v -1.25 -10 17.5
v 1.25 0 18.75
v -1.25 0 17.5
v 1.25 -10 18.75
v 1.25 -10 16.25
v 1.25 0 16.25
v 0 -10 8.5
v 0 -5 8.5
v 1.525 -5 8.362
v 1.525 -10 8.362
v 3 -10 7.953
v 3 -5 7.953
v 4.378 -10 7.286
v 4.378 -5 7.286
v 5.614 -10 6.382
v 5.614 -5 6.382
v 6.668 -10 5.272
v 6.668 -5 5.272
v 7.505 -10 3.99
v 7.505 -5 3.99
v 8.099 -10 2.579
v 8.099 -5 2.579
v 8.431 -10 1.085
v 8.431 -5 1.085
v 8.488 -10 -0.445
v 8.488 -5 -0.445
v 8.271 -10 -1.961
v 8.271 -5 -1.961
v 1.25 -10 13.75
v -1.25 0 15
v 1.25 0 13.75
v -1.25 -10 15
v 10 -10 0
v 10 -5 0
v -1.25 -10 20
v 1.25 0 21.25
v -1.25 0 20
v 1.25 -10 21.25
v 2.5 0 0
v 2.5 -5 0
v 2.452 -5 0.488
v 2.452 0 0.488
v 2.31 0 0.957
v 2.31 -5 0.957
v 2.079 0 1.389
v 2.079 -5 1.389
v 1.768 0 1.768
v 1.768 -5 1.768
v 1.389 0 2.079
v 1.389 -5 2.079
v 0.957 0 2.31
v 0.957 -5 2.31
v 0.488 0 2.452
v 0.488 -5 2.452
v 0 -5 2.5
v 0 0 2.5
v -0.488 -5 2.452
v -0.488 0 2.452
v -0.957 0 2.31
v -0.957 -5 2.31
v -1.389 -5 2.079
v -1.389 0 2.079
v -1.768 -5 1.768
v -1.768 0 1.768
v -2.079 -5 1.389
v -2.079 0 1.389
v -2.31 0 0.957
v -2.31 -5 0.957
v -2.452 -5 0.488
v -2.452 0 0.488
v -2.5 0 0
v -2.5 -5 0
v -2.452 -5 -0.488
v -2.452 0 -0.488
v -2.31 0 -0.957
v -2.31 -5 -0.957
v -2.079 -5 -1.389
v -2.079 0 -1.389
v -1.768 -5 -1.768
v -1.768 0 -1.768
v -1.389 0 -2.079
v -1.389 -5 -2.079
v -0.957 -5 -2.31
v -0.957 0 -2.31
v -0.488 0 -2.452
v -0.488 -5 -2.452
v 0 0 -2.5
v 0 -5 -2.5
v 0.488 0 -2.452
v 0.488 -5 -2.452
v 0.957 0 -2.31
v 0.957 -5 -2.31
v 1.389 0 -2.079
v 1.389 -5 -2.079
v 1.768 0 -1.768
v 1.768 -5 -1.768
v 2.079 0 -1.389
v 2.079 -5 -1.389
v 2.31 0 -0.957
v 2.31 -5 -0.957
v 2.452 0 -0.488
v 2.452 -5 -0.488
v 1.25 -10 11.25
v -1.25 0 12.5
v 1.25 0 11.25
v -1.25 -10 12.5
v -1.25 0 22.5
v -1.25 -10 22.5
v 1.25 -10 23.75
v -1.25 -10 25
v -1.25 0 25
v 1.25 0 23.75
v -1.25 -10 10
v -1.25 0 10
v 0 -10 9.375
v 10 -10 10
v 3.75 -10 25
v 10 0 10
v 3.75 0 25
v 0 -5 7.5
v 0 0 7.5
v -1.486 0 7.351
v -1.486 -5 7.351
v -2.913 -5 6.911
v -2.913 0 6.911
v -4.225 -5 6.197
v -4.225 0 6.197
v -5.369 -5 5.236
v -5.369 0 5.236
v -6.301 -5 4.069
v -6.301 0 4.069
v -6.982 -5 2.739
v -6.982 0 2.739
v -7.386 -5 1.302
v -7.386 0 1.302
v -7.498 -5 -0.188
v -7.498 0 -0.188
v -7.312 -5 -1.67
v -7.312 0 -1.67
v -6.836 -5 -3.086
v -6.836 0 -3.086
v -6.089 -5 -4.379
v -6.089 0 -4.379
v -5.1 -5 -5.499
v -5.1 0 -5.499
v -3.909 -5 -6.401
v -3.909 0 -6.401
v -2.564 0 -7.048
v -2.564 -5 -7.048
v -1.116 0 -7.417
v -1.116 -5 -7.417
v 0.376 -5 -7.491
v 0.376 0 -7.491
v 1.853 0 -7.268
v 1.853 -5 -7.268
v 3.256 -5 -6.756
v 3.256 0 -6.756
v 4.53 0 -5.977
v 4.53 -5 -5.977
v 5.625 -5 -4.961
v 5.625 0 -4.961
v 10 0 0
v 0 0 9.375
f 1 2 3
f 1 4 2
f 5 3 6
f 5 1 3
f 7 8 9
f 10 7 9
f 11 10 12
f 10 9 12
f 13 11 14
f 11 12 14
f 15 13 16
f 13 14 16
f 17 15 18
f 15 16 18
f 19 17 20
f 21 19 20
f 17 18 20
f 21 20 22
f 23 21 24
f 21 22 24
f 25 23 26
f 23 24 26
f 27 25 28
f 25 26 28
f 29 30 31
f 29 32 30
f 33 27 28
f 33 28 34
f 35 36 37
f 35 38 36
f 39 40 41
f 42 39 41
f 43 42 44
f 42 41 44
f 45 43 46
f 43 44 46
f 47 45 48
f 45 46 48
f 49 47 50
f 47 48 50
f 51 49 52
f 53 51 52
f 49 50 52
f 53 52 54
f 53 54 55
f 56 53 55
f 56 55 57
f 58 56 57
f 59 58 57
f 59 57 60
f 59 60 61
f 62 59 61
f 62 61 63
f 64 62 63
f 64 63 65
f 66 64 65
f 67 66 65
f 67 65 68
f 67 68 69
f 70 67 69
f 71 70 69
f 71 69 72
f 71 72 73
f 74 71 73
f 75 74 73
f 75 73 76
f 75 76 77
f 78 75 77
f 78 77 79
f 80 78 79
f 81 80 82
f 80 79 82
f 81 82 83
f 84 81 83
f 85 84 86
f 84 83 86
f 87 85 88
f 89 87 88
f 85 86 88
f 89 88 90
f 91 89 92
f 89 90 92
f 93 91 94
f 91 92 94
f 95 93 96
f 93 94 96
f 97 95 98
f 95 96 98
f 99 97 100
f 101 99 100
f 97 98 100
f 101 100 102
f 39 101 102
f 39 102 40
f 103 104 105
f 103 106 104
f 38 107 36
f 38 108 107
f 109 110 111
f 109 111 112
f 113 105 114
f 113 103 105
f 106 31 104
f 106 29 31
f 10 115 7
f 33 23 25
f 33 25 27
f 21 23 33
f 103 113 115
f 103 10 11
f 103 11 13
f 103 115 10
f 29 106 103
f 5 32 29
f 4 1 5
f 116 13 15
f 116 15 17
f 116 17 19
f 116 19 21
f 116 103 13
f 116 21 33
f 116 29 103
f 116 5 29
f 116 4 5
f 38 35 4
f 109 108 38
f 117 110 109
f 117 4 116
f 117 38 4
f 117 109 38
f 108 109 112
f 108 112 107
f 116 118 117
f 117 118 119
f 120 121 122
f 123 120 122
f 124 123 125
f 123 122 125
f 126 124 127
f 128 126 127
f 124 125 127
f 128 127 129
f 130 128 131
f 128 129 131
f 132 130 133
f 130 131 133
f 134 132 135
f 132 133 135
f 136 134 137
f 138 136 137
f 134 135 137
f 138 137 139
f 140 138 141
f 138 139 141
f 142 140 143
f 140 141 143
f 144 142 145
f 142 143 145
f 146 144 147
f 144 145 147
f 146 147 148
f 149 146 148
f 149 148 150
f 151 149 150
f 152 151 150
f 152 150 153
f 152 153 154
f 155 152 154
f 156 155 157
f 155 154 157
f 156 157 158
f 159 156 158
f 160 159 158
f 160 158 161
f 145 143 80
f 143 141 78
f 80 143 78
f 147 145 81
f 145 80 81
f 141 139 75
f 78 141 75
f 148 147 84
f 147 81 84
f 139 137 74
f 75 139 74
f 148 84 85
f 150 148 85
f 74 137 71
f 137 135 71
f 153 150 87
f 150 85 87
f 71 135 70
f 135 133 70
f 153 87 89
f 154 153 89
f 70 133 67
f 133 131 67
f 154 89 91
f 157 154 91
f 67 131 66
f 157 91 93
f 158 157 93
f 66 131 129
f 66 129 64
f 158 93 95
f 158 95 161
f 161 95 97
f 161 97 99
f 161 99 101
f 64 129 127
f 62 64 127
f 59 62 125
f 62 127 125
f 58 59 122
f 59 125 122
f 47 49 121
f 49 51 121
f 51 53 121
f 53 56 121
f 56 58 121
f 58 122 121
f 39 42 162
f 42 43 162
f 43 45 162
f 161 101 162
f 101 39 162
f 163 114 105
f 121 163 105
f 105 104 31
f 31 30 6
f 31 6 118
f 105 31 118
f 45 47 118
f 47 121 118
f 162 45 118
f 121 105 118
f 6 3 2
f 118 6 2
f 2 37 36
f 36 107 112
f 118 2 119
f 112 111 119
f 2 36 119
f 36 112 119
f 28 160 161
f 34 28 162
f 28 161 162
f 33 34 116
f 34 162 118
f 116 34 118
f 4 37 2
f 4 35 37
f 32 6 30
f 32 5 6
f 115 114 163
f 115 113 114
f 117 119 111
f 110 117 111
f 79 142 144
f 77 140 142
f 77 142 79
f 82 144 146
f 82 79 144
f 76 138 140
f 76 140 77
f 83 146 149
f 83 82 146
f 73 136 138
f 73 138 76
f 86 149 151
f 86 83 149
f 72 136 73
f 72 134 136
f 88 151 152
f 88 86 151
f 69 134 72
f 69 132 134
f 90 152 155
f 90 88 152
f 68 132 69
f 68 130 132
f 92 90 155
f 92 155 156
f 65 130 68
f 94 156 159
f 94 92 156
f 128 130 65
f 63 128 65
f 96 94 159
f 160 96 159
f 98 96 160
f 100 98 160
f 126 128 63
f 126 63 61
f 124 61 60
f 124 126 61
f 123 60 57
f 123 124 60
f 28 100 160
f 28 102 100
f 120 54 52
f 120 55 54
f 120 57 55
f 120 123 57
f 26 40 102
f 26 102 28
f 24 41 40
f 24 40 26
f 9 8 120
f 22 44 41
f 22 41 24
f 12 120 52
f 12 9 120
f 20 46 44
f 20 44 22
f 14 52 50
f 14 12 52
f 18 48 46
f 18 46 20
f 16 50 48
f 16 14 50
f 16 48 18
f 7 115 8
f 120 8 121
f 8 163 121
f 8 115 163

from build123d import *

# Parameters (mm, degrees)
F1_DEPTH      = 5
F3_DEPTH      = 5
F3_DEPTH_BACK = 5
F4_R          = 2.5
F5_DEPTH      = 5.001


with BuildPart() as f1:
    # F0 (on Front) → F1 (new body)
    with BuildSketch(Plane.XZ):
        with BuildLine():
            Line((0, 9.13175), (0, 7.5))
            ThreePointArc((0, 7.5), (-6.835784, -3.085784), (5.625, -4.960784))
            Line((5.625, -4.960784), (10, 0))
            Line((10, 0), (10, 10))
            Line((10, 10), (3.75, 25))
            Line((3.75, 25), (1.25, 25))
            Line((1.25, 25), (1.25, 10))
            Line((1.25, 10), (0, 9.13175))
        make_face()
    extrude(amount=F1_DEPTH)

    # F2 (on face) → F3 (join, two sides)
    with BuildSketch(Plane.XZ.offset(5)) as f3_sk:
        with BuildLine():
            Line((3.75, 25), (1.25, 25))
            Line((1.25, 25), (1.25, 23.75))
            Line((1.25, 23.75), (-1.25, 22.5))
            Line((-1.25, 22.5), (1.25, 21.25))
            Line((1.25, 21.25), (-1.25, 20))
            Line((-1.25, 20), (1.25, 18.75))
            Line((1.25, 18.75), (-1.25, 17.5))
            Line((-1.25, 17.5), (1.25, 16.25))
            Line((1.25, 16.25), (-1.25, 15))
            Line((-1.25, 15), (1.25, 13.75))
            Line((1.25, 13.75), (-1.25, 12.5))
            Line((-1.25, 12.5), (1.25, 11.25))
            Line((1.25, 11.25), (-1.25, 10))
            Line((-1.25, 10), (0, 9.375))
            Line((0, 9.375), (0, 9.13175))
            Line((0, 9.13175), (0, 8.5))
            ThreePointArc((0, 8.5), (6.667708, 5.27178), (8.270751, -1.960784))
            Line((8.270751, -1.960784), (10, 0))
            Line((10, 0), (10, 10))
            Line((10, 10), (3.75, 25))
        make_face()
        Polygon((1.25, 23.75), (1.25, 25), (-1.25, 25), align=None)
    extrude(amount=F3_DEPTH)
    extrude(f3_sk.sketch, amount=-F3_DEPTH_BACK)

    # F4 (on face) → F5 (cut, through all)
    with BuildSketch(Plane.XZ.offset(5)):
        Circle(F4_R)
    extrude(amount=-F5_DEPTH, mode=Mode.SUBTRACT)


with BuildPart() as f6_1:
    # F6: copy of F1
    add(f1.part)


with BuildPart() as f8_1:
    # F8: copy of F1
    add(f1.part.moved(Location((20, 0, 0))))


with BuildPart() as f10_1:
    # F10: copy of F1
    add(f1.part)


solid = f1.part
